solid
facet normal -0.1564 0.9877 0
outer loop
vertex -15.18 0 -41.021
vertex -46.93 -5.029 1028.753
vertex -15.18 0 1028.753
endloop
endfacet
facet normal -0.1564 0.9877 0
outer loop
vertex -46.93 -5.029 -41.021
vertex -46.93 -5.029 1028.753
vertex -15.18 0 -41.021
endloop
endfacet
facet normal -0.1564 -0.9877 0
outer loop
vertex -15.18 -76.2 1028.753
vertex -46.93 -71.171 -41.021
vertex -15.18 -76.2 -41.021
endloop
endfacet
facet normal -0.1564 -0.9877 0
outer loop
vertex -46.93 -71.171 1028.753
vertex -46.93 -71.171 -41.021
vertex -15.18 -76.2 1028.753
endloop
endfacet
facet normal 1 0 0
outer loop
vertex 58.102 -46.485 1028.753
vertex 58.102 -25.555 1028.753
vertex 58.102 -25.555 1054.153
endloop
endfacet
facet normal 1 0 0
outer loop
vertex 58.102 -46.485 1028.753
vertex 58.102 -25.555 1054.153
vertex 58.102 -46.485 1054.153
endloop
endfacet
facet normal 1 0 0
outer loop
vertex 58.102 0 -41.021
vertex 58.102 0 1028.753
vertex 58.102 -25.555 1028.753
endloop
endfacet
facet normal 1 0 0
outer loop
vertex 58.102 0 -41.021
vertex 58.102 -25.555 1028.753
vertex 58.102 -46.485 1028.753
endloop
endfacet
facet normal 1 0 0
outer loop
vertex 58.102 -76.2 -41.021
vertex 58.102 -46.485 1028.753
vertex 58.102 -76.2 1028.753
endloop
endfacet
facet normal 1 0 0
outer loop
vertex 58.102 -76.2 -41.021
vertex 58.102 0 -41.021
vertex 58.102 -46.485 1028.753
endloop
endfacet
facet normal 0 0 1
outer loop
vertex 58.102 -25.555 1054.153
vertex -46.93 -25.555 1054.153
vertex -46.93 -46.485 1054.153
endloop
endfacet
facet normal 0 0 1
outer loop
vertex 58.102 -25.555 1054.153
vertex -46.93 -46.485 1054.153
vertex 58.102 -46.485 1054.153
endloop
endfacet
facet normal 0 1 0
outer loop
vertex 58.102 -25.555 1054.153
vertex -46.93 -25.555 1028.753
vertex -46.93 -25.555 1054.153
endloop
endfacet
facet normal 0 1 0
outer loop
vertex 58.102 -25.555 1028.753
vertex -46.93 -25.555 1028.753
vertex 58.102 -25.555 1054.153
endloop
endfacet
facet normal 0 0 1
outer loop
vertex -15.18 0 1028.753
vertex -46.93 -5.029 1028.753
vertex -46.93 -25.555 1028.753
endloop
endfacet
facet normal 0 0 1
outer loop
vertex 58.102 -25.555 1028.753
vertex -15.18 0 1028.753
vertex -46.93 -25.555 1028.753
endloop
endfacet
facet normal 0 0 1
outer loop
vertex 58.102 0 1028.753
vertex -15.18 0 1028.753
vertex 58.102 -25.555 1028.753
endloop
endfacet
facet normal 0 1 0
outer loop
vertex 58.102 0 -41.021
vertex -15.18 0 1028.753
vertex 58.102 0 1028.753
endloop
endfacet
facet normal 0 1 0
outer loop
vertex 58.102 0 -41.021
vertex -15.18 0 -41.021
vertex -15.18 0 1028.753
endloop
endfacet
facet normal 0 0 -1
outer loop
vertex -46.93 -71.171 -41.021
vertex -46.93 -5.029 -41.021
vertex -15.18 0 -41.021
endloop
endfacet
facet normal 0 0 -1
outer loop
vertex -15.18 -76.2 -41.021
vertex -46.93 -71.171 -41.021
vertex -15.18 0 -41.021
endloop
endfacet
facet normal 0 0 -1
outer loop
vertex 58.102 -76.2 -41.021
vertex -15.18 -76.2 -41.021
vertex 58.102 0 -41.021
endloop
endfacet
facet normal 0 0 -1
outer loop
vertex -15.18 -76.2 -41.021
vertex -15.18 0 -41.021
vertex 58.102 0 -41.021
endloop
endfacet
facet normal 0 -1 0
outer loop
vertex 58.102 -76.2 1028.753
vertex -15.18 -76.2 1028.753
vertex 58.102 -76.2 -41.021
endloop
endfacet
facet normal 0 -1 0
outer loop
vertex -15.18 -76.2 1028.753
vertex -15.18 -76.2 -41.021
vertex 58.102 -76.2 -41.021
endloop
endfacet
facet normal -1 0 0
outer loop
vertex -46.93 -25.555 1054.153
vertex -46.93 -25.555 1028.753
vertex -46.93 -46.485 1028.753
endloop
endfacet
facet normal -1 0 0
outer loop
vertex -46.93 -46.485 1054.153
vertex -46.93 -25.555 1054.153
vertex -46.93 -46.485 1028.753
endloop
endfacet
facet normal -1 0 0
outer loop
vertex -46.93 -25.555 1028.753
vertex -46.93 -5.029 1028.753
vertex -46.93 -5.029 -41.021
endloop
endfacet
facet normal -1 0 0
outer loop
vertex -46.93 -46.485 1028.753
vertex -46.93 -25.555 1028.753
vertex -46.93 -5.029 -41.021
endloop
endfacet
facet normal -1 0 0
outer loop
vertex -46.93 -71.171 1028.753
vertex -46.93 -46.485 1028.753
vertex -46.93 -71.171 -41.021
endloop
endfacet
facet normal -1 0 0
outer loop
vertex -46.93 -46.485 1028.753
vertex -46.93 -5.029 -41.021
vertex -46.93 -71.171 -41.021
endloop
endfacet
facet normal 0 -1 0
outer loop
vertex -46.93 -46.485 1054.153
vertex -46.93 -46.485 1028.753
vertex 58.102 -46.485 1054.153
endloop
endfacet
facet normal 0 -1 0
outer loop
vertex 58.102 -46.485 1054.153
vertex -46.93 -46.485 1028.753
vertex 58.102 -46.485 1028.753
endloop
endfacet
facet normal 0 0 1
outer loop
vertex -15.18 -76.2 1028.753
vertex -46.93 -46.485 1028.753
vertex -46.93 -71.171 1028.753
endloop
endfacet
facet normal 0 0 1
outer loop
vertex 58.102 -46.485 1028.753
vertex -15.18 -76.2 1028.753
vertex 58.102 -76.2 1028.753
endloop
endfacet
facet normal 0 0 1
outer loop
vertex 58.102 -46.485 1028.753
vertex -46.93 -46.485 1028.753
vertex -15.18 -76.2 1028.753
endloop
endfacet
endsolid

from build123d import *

# Parameters (mm, degrees)
F0_W     = 105.0320863724
F0_H     = 79.1744627059
F1_DEPTH = 76.2
F2_DEPTH = 990.6
F3_W     = 105.0320863724
F3_H     = 20.9305938333
F4_DEPTH = 25.4
F5_SIZE2 = 5.0287059803
F5_SIZE  = 31.75
F6_SIZE2 = 5.0287059803
F6_SIZE  = 31.75


# Not quite as in the source:
# - the program builds the solid bodies; features that only make, move or delete a surface that nothing else refers to are left out


with BuildPart() as f1:
    # F0 (on Front) → F1 (new body)
    with BuildSketch(Plane.XZ):
        with Locations((5.5860057473, -1.434026286)):
            Rectangle(F0_W, F0_H)
    extrude(amount=F1_DEPTH)

    # F2 (add): a face of the model
    f2_faces = [f1.faces().sort_by_distance(p)[0] for p in [
        (5.5860057473, -38.1, 38.1532050669),
    ]]
    extrude(f2_faces, amount=F2_DEPTH)

    # F3 (on face) → F4 (join)
    with BuildSketch(Plane.XY.offset(1028.7532050669)):
        with Locations((5.5860057473, -36.0199743882)):
            Rectangle(F3_W, F3_H)
    extrude(amount=F4_DEPTH)

    # F5
    f5_edges = [f1.edges().sort_by_distance(p)[0] for p in [
        (-46.930037, -76.2, 493.865974),
    ]]
    f5_side = f1.faces().sort_by_distance((5.586006, -76.2, 493.865974))[0]
    chamfer(f5_edges, length=F5_SIZE, length2=F5_SIZE2, reference=f5_side)

    # F6
    f6_edges = [f1.edges().sort_by_distance(p)[0] for p in [
        (-46.930037, 0, 493.865974),
    ]]
    f6_side = f1.faces().sort_by_distance((5.586006, 0, 493.865974))[0]
    chamfer(f6_edges, length=F6_SIZE, length2=F6_SIZE2, reference=f6_side)


solid = f1.part
